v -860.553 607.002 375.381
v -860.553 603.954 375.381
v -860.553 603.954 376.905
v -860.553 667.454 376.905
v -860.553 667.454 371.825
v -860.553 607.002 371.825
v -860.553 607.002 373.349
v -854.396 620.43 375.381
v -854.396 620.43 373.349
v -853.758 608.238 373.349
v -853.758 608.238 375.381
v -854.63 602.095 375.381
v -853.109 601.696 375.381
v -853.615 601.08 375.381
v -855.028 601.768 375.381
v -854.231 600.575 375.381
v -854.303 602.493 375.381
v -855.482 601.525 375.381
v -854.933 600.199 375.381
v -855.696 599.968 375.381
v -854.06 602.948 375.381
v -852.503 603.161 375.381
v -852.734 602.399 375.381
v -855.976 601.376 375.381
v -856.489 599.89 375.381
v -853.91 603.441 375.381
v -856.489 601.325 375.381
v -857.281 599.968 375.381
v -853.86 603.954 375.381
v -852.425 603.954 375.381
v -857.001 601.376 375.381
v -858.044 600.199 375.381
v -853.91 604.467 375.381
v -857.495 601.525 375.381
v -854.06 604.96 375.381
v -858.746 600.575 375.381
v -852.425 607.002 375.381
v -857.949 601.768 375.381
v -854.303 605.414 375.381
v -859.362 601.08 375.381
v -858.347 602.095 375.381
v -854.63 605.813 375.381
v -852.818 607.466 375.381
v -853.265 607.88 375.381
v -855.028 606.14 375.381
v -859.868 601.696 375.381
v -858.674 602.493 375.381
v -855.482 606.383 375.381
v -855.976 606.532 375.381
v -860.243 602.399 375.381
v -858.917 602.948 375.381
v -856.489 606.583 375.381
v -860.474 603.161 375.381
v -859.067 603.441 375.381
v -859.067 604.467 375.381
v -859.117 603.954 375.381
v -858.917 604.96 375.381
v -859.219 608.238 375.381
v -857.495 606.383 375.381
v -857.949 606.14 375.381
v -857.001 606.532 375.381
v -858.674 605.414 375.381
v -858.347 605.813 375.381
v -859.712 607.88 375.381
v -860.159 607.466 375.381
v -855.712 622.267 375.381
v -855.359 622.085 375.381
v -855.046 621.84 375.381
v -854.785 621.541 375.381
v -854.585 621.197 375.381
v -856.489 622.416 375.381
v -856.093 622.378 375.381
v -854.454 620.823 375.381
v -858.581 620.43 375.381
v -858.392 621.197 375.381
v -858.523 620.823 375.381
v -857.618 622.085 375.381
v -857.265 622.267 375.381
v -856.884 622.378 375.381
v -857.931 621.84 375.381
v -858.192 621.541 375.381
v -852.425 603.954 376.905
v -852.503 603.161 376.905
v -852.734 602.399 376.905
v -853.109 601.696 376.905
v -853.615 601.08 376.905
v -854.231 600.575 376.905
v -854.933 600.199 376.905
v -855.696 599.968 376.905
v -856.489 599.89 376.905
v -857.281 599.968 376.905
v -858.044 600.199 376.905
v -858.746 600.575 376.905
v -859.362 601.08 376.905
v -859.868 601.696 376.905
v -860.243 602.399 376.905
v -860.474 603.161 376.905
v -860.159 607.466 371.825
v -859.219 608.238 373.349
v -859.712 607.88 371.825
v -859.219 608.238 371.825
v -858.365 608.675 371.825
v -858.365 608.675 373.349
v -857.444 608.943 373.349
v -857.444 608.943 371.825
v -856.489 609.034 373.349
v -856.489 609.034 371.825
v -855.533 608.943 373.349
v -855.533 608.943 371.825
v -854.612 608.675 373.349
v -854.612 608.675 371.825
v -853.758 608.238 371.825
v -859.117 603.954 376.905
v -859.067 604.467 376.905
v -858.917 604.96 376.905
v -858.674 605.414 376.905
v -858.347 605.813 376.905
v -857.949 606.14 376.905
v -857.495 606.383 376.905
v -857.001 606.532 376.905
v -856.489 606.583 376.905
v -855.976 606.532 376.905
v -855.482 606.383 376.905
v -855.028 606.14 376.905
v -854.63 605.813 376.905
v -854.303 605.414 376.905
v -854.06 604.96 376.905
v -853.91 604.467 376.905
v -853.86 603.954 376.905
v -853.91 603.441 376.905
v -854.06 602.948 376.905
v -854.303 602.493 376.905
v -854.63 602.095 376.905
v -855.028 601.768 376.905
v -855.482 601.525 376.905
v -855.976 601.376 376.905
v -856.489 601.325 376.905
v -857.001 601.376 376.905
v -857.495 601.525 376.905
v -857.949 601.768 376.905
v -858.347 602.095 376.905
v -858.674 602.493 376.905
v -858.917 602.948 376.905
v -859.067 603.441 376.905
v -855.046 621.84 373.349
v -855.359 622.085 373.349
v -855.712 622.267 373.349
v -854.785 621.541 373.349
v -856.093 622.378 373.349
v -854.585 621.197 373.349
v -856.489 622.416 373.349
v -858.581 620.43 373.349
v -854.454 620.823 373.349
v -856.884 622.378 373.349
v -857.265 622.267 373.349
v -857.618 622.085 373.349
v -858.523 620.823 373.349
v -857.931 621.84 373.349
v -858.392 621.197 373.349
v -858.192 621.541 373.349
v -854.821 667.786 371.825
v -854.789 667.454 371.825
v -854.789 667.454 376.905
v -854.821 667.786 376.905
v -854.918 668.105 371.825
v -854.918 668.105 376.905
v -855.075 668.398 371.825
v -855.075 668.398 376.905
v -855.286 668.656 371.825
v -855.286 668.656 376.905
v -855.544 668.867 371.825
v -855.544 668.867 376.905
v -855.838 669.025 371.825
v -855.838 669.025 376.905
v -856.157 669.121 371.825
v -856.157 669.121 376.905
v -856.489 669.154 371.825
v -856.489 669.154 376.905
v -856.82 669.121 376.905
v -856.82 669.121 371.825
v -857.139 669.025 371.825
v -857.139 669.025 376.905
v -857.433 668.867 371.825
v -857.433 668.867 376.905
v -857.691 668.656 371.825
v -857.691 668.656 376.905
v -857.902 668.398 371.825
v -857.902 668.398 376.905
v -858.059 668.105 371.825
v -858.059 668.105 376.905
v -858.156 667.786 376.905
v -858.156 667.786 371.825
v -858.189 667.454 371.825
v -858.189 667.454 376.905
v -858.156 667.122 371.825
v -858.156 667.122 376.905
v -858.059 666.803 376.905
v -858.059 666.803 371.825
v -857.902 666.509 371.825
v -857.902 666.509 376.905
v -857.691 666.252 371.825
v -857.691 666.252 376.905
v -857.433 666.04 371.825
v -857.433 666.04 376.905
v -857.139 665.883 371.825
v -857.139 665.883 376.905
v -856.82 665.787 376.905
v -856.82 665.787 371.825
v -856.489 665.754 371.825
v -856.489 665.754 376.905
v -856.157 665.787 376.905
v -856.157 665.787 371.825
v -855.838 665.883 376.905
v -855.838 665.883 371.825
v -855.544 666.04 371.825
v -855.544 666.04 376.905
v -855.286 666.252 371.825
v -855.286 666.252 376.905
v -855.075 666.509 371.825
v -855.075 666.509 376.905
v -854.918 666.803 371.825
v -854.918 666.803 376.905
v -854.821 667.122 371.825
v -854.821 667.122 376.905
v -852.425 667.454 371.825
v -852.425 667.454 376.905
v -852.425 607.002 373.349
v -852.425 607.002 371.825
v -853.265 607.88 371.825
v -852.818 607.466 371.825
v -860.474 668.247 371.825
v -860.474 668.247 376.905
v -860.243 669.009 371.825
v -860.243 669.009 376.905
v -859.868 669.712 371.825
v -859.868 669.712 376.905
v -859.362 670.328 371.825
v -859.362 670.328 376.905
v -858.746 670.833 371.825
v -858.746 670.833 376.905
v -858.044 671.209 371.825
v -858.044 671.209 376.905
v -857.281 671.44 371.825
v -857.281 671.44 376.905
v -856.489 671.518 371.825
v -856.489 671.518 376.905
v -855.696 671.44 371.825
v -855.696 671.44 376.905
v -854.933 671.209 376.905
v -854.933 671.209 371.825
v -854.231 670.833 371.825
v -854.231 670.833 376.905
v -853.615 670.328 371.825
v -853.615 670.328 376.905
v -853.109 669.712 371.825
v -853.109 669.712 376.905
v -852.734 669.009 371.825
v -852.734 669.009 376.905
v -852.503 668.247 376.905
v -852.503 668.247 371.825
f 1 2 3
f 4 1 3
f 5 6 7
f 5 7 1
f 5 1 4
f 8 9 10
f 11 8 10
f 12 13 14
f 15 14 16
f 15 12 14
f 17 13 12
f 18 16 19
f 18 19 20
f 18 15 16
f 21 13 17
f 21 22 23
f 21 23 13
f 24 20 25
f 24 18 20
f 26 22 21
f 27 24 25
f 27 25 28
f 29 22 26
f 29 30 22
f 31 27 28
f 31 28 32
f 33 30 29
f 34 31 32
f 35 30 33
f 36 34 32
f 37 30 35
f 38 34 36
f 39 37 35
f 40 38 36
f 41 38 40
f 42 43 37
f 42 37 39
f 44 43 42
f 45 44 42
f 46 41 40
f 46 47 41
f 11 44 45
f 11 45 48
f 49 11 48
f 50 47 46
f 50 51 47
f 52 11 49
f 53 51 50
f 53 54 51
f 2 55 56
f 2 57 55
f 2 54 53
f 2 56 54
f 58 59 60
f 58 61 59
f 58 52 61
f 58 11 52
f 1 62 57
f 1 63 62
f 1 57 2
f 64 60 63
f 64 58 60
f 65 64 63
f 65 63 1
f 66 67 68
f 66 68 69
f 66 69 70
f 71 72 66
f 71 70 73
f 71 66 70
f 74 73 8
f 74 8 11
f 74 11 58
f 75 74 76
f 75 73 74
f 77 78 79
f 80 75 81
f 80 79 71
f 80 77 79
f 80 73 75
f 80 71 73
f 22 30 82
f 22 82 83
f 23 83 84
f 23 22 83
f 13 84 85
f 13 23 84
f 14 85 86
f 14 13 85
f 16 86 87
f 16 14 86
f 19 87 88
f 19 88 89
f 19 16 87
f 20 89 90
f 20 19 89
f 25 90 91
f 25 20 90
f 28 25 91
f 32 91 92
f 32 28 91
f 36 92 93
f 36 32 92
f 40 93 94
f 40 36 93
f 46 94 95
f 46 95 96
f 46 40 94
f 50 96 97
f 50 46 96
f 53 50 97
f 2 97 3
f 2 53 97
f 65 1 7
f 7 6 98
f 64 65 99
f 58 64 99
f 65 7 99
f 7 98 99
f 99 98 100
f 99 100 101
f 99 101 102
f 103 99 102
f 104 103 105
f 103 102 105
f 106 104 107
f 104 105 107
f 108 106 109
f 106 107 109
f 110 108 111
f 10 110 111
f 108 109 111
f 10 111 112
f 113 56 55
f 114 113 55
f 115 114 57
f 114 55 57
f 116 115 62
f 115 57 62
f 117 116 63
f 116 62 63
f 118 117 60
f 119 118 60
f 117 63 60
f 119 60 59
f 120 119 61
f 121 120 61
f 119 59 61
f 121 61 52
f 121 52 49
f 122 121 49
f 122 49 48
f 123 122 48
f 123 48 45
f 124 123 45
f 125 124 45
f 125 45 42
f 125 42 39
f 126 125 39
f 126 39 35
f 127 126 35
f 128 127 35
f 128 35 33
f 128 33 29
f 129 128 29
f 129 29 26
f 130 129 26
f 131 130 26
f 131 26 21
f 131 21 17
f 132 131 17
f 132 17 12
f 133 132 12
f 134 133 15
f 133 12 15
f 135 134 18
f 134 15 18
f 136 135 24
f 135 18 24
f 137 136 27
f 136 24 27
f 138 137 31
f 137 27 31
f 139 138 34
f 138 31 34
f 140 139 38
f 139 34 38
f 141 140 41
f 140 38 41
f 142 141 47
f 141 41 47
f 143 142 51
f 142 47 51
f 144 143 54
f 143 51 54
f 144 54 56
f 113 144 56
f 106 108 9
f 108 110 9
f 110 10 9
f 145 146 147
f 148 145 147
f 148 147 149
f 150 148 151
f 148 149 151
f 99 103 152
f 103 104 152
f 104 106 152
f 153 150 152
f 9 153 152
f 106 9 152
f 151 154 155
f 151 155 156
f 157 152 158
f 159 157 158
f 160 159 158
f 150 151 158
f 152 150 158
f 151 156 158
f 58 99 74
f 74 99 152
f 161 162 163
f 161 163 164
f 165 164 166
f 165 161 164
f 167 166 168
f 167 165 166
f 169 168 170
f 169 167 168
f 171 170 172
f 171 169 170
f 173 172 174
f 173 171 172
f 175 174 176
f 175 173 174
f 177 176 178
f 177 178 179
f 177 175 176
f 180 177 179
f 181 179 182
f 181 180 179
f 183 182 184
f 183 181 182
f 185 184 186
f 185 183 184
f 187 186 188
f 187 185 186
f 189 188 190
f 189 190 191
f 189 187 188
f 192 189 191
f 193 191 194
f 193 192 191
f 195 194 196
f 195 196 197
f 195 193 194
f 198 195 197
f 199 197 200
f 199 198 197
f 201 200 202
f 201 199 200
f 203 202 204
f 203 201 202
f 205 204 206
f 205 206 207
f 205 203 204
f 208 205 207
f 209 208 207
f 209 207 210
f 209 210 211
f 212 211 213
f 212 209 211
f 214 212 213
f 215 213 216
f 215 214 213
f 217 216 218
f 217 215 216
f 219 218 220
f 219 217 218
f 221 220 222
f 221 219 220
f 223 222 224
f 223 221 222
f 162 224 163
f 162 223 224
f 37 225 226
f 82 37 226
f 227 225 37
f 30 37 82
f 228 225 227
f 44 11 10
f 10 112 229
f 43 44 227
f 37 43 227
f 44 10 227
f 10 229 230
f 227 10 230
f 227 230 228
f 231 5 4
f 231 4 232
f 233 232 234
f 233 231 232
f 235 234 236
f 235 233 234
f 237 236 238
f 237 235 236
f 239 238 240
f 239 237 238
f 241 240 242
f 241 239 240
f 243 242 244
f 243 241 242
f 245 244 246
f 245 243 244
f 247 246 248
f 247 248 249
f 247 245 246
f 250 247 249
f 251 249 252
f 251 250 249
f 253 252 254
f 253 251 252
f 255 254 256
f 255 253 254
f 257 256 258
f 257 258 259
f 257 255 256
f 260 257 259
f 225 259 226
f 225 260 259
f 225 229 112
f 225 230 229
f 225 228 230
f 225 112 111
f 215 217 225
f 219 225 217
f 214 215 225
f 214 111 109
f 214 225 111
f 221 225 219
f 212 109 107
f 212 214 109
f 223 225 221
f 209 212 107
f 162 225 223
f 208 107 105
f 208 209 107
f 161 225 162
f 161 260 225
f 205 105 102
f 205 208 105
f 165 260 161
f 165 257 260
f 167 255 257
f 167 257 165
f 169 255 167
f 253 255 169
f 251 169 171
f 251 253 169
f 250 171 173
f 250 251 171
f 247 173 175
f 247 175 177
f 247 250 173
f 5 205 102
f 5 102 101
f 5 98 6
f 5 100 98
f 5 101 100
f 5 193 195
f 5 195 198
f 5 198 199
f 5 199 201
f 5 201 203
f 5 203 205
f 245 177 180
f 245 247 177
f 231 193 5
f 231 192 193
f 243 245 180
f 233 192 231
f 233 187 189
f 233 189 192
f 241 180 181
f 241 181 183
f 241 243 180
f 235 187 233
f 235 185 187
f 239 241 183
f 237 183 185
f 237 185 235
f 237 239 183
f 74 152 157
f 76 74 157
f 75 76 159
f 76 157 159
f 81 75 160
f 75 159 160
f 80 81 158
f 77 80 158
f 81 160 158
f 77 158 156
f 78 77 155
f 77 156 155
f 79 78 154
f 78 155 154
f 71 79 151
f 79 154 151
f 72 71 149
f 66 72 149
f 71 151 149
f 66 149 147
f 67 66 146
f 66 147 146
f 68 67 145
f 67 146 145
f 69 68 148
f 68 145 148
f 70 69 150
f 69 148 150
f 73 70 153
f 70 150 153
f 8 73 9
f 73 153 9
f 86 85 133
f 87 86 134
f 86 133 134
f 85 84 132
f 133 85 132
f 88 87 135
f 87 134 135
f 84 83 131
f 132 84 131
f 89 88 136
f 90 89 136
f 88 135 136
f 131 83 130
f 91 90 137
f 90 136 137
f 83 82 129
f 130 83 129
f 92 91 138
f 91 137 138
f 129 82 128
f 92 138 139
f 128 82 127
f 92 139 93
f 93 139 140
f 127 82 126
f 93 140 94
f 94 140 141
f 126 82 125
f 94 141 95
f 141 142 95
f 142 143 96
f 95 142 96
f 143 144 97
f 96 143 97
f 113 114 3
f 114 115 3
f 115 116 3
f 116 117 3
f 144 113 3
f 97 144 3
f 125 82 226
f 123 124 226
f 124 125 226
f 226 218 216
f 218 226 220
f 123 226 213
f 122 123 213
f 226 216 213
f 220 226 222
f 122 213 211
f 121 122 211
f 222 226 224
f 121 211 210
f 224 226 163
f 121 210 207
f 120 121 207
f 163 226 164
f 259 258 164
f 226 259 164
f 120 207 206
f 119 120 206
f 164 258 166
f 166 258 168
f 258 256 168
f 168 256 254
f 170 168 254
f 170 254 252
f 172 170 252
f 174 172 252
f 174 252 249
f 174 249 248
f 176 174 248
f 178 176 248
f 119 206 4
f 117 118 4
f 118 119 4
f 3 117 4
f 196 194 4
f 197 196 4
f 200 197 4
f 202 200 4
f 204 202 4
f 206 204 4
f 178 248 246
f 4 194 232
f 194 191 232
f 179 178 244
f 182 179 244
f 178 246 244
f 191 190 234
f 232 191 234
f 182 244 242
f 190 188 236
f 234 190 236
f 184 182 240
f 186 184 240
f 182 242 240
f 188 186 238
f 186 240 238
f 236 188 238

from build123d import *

# Parameters (mm, degrees)
SKETCH1_R           = 1.700000029
BOSS_EXTRUDE1_DEPTH = 5.08
CUT_EXTRUDE1_START  = -2.54
CUT_EXTRUDE1_DEPTH  = 1.016
SKETCH3_R           = 2.6289
CUT_EXTRUDE2_DEPTH  = 2.032
CUT_EXTRUDE3_REACH  = 7.08
SKETCH2_3_R         = 1.700000029


with BuildPart() as part:
    # Sketch1 → Boss-Extrude1 (new body)
    with BuildSketch(Plane(origin=(-856.488519717, 635.703940982, 371.824950285), x_dir=(1, 0, 0), z_dir=(0, 0, 1))):
        with BuildLine():
            Line((4.064, 31.75), (4.064, -31.75))
            ThreePointArc((4.064, -31.75), (0, -35.814), (-4.064, -31.75))
            Line((-4.064, -31.75), (-4.064, 31.75))
            ThreePointArc((-4.064, 31.75), (0, 35.814), (4.064, 31.75))
        make_face()
        with Locations((0, -31.75)):
            Circle(SKETCH1_R, mode=Mode.SUBTRACT)
        with Locations((0, 31.75)):
            Circle(SKETCH1_R, mode=Mode.SUBTRACT)
    extrude(amount=BOSS_EXTRUDE1_DEPTH)

    # Sketch2 → Cut-Extrude1 (cut, symmetric)
    with BuildSketch(Plane(origin=(0, 0, 371.824950285), x_dir=(-1, 0, 0), z_dir=(0, 0, -1)).offset(CUT_EXTRUDE1_START)):
        with BuildLine():
            Line((859.219019717, 608.237720826), (858.581157709, 620.429720826))
            ThreePointArc((858.581157709, 620.429720826), (856.488519717, 622.415738028), (854.395881724, 620.429720826))
            Line((854.395881724, 620.429720826), (853.758019717, 608.237720826))
            ThreePointArc((853.758019717, 608.237720826), (856.488519717, 598.873940982), (859.219019717, 608.237720826))
        make_face()
    extrude(amount=CUT_EXTRUDE1_DEPTH, both=True, mode=Mode.SUBTRACT)

    # Sketch3 → Cut-Extrude2 (cut)
    with BuildSketch(Plane(origin=(0, 0, 375.380950285), x_dir=(-1, 0, 0), z_dir=(0, 0, -1))):
        with Locations((856.488519717, 603.953940982)):
            Circle(SKETCH3_R)
    extrude(amount=-CUT_EXTRUDE2_DEPTH, mode=Mode.SUBTRACT)

    # Sketch2_3 → Cut-Extrude3 (cut, up to next)
    with BuildSketch(Plane(origin=(0, 0, 371.824950285), x_dir=(-1, 0, 0), z_dir=(0, 0, -1)), mode=Mode.PRIVATE) as cut_extrude3_sk1:
        with BuildLine():
            ThreePointArc((860.552519717, 607.001940982), (859.941503284, 607.679971642), (859.219019717, 608.237720826))
            ThreePointArc((859.219019717, 608.237720826), (856.488519717, 609.033940982), (853.758019717, 608.237720826))
            ThreePointArc((853.758019717, 608.237720826), (853.035536149, 607.679971642), (852.424519717, 607.001940982))
            Line((852.424519717, 607.001940982), (852.424519717, 603.953940982))
            ThreePointArc((852.424519717, 603.953940982), (856.488519717, 599.889940982), (860.552519717, 603.953940982))
            Line((860.552519717, 603.953940982), (860.552519717, 607.001940982))
        make_face()
        with Locations((856.488519717, 603.953940982)):
            Circle(SKETCH2_3_R, mode=Mode.SUBTRACT)
    cut_extrude3_tool1 = extrude(cut_extrude3_sk1.sketch, amount=-CUT_EXTRUDE3_REACH, mode=Mode.PRIVATE) & part.part
    add(cut_extrude3_tool1.solids().sort_by_distance((-859.858344, 607.590237, 371.82495))[0], mode=Mode.SUBTRACT)


solid = part.part
